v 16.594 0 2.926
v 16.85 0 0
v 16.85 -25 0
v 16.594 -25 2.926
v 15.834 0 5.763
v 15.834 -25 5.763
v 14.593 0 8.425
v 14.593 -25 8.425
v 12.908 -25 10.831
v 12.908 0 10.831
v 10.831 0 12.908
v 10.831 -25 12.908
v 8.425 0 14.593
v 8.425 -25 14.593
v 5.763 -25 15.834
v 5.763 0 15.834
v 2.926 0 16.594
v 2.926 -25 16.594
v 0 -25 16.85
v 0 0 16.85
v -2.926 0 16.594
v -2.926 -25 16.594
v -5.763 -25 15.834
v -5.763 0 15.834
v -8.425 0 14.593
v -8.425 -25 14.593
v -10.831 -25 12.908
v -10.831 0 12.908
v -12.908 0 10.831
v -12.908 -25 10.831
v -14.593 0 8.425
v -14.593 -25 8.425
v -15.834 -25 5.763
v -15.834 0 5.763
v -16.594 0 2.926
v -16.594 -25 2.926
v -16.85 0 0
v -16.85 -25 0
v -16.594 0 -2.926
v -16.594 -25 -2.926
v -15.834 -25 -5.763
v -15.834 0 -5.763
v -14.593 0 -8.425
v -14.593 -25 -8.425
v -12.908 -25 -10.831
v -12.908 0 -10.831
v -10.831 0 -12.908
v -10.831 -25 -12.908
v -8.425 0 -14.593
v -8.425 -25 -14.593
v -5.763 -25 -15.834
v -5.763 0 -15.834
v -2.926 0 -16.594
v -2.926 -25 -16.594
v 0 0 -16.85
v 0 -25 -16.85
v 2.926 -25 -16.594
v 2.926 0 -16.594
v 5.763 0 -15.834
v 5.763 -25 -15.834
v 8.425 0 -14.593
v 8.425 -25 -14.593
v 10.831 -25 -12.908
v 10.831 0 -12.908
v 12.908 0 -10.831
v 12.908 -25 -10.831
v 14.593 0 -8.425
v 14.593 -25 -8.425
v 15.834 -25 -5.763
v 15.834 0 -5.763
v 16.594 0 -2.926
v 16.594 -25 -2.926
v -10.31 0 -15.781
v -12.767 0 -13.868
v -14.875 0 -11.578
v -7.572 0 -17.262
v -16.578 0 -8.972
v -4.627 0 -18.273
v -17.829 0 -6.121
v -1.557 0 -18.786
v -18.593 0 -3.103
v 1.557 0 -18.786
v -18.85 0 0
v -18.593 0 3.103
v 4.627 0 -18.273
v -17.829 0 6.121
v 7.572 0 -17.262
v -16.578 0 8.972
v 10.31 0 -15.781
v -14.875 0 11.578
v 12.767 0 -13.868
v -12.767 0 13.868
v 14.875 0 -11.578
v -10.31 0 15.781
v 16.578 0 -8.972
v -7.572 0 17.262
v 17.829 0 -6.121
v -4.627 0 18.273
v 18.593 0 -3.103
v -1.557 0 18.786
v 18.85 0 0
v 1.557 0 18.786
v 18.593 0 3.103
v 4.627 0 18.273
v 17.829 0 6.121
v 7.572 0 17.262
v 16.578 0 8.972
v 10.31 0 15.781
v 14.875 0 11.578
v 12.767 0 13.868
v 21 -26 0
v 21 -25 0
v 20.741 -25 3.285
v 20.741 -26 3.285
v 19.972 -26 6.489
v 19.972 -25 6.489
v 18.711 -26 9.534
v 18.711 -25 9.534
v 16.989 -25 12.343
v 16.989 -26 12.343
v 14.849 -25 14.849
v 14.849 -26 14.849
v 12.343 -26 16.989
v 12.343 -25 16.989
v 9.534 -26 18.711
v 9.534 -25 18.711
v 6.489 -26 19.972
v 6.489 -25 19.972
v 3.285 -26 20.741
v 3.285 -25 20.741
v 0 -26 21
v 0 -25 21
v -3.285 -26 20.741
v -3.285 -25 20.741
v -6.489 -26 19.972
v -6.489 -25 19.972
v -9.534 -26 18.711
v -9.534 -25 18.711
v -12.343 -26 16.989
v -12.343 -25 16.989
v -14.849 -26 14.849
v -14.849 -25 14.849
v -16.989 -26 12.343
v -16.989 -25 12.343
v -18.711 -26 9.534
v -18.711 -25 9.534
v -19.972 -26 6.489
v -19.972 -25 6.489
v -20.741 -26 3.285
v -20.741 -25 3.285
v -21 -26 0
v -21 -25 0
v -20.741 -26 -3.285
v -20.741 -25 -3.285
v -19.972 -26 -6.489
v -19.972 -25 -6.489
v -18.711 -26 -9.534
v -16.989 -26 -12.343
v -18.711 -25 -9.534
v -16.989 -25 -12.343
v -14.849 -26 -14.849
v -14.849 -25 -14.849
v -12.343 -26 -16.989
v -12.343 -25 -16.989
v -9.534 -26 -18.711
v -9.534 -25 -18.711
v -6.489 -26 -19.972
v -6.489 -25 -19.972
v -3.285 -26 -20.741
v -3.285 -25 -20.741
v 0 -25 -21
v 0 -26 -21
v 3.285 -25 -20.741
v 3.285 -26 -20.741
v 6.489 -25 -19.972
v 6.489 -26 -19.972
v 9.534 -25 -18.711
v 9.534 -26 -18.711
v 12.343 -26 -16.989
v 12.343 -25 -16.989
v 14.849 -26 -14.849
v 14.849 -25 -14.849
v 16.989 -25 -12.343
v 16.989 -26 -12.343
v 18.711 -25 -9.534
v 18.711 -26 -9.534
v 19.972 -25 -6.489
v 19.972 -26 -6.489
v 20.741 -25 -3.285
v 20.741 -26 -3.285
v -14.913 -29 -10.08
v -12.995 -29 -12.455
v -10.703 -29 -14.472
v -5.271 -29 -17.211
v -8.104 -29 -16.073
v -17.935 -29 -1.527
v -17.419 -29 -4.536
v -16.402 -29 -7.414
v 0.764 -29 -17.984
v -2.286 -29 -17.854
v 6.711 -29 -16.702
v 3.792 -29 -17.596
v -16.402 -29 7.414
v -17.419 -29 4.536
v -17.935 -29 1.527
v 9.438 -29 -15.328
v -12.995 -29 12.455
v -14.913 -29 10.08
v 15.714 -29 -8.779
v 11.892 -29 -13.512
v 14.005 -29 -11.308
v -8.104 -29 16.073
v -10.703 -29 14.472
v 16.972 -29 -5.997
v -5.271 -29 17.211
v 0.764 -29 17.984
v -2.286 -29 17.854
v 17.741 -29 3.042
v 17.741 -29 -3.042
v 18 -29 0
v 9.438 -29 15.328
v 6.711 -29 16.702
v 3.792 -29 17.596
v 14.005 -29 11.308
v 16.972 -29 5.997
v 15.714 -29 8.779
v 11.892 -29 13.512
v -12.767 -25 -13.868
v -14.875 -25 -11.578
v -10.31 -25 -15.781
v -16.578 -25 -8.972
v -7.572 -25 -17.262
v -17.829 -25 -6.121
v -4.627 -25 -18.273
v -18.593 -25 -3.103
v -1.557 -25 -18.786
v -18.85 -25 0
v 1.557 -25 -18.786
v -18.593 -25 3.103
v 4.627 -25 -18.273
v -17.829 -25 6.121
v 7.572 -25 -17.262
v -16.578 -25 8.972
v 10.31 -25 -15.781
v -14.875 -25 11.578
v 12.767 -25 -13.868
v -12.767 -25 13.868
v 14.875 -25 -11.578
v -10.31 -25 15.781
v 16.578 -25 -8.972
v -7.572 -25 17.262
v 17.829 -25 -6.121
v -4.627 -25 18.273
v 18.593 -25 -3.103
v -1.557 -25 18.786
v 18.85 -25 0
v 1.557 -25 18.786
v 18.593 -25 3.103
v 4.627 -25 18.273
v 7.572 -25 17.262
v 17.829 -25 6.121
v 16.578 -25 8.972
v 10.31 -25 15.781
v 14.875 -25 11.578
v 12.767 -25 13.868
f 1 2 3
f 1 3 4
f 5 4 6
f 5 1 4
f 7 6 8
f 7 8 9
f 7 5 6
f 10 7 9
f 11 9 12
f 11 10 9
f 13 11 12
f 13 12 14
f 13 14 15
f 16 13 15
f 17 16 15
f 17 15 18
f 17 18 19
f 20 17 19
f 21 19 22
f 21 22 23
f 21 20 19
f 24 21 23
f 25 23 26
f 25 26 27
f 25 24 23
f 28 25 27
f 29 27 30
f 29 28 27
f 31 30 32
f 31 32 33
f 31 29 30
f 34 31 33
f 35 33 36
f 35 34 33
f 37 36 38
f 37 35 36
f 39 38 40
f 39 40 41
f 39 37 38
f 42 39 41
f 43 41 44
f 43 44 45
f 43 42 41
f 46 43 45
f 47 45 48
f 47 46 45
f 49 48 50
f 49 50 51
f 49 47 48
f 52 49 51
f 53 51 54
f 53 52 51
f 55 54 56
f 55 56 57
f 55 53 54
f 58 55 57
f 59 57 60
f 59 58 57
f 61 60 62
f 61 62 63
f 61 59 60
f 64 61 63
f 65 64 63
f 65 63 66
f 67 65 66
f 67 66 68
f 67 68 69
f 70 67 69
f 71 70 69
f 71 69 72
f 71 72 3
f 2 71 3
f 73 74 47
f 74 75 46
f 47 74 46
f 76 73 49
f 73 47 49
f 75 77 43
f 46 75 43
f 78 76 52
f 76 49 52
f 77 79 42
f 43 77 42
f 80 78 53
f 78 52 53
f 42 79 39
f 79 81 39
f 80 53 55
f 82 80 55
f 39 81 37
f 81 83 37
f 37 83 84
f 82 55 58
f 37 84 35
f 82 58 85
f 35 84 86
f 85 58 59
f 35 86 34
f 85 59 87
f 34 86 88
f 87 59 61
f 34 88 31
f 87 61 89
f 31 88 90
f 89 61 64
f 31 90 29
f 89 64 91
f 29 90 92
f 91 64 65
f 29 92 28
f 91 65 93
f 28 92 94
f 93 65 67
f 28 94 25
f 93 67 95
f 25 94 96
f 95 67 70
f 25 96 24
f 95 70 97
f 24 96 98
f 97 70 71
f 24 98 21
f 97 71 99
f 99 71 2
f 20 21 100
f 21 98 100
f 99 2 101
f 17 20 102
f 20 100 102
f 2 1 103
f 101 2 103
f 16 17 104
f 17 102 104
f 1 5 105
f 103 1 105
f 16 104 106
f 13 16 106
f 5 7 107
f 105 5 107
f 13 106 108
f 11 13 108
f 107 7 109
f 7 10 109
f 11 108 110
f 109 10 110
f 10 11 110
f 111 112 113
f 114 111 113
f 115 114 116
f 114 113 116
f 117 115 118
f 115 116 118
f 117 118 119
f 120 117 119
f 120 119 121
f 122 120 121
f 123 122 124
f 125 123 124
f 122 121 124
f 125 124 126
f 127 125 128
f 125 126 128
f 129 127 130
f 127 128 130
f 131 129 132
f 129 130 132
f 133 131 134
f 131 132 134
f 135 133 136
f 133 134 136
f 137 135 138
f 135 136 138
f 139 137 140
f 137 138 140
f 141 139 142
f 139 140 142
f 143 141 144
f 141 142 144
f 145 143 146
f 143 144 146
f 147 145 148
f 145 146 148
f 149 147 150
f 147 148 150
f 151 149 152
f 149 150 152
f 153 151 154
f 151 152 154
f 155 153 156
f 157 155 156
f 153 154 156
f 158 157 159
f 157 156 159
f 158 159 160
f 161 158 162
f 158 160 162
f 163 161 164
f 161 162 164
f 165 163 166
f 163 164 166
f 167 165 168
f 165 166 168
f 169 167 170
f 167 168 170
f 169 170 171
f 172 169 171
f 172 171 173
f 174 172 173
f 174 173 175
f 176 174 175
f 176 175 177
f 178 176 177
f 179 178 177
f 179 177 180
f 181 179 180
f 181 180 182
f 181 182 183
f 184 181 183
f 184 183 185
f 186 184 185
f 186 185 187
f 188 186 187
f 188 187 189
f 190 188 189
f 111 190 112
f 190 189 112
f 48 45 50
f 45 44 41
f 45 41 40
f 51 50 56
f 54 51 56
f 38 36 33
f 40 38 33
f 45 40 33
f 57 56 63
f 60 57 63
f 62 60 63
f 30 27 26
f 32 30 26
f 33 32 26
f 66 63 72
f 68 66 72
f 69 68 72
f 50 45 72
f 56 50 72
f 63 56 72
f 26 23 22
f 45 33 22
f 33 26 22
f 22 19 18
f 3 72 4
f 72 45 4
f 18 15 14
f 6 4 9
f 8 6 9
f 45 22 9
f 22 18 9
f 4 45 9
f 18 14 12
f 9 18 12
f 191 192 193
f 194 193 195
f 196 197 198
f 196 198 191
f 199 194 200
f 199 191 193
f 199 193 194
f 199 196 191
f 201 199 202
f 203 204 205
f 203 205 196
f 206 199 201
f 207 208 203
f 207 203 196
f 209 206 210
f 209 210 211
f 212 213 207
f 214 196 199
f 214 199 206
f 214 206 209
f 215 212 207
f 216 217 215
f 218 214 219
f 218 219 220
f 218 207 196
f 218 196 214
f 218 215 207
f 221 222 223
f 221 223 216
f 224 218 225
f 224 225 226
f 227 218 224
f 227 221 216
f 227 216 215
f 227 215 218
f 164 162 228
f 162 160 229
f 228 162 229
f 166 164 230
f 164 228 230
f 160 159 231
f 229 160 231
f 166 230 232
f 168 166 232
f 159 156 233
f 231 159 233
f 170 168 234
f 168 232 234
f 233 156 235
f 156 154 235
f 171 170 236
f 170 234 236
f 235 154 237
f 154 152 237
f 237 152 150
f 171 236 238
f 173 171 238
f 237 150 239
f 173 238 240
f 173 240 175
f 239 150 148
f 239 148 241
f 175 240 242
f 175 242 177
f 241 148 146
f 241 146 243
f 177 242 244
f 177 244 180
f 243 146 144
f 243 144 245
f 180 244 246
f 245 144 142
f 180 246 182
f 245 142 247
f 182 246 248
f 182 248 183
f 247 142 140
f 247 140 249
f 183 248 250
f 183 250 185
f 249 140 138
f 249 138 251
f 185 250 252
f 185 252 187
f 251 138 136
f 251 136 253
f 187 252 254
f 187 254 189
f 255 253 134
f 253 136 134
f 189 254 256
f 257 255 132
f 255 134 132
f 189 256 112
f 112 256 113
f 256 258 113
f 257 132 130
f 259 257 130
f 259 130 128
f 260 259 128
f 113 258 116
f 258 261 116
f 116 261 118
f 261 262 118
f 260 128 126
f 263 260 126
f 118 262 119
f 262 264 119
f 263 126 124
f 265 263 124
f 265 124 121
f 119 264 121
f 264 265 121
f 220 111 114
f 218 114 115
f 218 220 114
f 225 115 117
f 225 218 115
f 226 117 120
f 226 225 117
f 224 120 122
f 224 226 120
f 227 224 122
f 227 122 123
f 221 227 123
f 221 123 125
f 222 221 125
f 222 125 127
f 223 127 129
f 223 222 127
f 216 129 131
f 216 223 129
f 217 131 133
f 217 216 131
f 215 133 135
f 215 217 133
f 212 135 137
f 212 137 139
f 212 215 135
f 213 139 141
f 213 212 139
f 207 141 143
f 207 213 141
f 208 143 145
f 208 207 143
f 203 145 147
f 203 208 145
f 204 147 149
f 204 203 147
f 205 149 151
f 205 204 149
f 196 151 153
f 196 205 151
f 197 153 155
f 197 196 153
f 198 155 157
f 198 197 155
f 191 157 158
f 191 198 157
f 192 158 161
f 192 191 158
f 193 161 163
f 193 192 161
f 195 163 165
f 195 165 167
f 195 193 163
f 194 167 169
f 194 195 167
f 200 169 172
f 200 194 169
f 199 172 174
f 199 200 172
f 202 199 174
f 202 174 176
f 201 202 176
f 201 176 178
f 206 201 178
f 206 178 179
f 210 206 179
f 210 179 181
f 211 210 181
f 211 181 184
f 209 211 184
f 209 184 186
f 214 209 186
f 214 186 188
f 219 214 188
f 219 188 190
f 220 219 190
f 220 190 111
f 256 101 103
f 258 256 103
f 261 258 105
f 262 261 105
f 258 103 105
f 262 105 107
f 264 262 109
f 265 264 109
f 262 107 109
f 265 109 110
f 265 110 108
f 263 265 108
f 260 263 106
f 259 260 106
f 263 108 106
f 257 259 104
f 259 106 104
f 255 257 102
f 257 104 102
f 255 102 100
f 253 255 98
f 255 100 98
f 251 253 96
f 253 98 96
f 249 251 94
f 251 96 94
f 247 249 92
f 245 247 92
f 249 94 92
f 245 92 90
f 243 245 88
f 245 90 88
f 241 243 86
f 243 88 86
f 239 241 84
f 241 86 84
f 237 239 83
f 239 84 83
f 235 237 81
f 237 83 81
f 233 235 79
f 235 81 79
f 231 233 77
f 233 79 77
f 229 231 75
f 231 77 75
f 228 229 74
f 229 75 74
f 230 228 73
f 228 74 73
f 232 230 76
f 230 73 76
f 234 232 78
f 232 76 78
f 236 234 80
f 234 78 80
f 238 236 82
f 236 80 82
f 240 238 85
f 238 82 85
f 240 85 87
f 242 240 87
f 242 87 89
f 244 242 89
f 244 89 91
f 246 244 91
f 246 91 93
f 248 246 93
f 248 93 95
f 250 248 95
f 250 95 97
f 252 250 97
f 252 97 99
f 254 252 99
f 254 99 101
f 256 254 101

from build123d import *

# Parameters (mm, degrees)
F0_R     = 18.85
F0_R_2   = 16.85
F1_DEPTH = 25
F2_R     = 21
F3_DEPTH = 4
F4_SIZE  = 3


with BuildPart() as f1:
    # F0 (on Front) → F1 (new body)
    with BuildSketch(Plane.XZ):
        Circle(F0_R)
        Circle(F0_R_2, mode=Mode.SUBTRACT)
    extrude(amount=F1_DEPTH)

    # F2 (on face) → F3 (join)
    with BuildSketch(Plane.XZ.offset(25)):
        Circle(F2_R)
    extrude(amount=F3_DEPTH)

    # F4
    f4_edges = [f1.edges().sort_by_distance(p)[0] for p in [
        (-21, -29, 0),
    ]]
    chamfer(f4_edges, length=F4_SIZE)


solid = f1.part
